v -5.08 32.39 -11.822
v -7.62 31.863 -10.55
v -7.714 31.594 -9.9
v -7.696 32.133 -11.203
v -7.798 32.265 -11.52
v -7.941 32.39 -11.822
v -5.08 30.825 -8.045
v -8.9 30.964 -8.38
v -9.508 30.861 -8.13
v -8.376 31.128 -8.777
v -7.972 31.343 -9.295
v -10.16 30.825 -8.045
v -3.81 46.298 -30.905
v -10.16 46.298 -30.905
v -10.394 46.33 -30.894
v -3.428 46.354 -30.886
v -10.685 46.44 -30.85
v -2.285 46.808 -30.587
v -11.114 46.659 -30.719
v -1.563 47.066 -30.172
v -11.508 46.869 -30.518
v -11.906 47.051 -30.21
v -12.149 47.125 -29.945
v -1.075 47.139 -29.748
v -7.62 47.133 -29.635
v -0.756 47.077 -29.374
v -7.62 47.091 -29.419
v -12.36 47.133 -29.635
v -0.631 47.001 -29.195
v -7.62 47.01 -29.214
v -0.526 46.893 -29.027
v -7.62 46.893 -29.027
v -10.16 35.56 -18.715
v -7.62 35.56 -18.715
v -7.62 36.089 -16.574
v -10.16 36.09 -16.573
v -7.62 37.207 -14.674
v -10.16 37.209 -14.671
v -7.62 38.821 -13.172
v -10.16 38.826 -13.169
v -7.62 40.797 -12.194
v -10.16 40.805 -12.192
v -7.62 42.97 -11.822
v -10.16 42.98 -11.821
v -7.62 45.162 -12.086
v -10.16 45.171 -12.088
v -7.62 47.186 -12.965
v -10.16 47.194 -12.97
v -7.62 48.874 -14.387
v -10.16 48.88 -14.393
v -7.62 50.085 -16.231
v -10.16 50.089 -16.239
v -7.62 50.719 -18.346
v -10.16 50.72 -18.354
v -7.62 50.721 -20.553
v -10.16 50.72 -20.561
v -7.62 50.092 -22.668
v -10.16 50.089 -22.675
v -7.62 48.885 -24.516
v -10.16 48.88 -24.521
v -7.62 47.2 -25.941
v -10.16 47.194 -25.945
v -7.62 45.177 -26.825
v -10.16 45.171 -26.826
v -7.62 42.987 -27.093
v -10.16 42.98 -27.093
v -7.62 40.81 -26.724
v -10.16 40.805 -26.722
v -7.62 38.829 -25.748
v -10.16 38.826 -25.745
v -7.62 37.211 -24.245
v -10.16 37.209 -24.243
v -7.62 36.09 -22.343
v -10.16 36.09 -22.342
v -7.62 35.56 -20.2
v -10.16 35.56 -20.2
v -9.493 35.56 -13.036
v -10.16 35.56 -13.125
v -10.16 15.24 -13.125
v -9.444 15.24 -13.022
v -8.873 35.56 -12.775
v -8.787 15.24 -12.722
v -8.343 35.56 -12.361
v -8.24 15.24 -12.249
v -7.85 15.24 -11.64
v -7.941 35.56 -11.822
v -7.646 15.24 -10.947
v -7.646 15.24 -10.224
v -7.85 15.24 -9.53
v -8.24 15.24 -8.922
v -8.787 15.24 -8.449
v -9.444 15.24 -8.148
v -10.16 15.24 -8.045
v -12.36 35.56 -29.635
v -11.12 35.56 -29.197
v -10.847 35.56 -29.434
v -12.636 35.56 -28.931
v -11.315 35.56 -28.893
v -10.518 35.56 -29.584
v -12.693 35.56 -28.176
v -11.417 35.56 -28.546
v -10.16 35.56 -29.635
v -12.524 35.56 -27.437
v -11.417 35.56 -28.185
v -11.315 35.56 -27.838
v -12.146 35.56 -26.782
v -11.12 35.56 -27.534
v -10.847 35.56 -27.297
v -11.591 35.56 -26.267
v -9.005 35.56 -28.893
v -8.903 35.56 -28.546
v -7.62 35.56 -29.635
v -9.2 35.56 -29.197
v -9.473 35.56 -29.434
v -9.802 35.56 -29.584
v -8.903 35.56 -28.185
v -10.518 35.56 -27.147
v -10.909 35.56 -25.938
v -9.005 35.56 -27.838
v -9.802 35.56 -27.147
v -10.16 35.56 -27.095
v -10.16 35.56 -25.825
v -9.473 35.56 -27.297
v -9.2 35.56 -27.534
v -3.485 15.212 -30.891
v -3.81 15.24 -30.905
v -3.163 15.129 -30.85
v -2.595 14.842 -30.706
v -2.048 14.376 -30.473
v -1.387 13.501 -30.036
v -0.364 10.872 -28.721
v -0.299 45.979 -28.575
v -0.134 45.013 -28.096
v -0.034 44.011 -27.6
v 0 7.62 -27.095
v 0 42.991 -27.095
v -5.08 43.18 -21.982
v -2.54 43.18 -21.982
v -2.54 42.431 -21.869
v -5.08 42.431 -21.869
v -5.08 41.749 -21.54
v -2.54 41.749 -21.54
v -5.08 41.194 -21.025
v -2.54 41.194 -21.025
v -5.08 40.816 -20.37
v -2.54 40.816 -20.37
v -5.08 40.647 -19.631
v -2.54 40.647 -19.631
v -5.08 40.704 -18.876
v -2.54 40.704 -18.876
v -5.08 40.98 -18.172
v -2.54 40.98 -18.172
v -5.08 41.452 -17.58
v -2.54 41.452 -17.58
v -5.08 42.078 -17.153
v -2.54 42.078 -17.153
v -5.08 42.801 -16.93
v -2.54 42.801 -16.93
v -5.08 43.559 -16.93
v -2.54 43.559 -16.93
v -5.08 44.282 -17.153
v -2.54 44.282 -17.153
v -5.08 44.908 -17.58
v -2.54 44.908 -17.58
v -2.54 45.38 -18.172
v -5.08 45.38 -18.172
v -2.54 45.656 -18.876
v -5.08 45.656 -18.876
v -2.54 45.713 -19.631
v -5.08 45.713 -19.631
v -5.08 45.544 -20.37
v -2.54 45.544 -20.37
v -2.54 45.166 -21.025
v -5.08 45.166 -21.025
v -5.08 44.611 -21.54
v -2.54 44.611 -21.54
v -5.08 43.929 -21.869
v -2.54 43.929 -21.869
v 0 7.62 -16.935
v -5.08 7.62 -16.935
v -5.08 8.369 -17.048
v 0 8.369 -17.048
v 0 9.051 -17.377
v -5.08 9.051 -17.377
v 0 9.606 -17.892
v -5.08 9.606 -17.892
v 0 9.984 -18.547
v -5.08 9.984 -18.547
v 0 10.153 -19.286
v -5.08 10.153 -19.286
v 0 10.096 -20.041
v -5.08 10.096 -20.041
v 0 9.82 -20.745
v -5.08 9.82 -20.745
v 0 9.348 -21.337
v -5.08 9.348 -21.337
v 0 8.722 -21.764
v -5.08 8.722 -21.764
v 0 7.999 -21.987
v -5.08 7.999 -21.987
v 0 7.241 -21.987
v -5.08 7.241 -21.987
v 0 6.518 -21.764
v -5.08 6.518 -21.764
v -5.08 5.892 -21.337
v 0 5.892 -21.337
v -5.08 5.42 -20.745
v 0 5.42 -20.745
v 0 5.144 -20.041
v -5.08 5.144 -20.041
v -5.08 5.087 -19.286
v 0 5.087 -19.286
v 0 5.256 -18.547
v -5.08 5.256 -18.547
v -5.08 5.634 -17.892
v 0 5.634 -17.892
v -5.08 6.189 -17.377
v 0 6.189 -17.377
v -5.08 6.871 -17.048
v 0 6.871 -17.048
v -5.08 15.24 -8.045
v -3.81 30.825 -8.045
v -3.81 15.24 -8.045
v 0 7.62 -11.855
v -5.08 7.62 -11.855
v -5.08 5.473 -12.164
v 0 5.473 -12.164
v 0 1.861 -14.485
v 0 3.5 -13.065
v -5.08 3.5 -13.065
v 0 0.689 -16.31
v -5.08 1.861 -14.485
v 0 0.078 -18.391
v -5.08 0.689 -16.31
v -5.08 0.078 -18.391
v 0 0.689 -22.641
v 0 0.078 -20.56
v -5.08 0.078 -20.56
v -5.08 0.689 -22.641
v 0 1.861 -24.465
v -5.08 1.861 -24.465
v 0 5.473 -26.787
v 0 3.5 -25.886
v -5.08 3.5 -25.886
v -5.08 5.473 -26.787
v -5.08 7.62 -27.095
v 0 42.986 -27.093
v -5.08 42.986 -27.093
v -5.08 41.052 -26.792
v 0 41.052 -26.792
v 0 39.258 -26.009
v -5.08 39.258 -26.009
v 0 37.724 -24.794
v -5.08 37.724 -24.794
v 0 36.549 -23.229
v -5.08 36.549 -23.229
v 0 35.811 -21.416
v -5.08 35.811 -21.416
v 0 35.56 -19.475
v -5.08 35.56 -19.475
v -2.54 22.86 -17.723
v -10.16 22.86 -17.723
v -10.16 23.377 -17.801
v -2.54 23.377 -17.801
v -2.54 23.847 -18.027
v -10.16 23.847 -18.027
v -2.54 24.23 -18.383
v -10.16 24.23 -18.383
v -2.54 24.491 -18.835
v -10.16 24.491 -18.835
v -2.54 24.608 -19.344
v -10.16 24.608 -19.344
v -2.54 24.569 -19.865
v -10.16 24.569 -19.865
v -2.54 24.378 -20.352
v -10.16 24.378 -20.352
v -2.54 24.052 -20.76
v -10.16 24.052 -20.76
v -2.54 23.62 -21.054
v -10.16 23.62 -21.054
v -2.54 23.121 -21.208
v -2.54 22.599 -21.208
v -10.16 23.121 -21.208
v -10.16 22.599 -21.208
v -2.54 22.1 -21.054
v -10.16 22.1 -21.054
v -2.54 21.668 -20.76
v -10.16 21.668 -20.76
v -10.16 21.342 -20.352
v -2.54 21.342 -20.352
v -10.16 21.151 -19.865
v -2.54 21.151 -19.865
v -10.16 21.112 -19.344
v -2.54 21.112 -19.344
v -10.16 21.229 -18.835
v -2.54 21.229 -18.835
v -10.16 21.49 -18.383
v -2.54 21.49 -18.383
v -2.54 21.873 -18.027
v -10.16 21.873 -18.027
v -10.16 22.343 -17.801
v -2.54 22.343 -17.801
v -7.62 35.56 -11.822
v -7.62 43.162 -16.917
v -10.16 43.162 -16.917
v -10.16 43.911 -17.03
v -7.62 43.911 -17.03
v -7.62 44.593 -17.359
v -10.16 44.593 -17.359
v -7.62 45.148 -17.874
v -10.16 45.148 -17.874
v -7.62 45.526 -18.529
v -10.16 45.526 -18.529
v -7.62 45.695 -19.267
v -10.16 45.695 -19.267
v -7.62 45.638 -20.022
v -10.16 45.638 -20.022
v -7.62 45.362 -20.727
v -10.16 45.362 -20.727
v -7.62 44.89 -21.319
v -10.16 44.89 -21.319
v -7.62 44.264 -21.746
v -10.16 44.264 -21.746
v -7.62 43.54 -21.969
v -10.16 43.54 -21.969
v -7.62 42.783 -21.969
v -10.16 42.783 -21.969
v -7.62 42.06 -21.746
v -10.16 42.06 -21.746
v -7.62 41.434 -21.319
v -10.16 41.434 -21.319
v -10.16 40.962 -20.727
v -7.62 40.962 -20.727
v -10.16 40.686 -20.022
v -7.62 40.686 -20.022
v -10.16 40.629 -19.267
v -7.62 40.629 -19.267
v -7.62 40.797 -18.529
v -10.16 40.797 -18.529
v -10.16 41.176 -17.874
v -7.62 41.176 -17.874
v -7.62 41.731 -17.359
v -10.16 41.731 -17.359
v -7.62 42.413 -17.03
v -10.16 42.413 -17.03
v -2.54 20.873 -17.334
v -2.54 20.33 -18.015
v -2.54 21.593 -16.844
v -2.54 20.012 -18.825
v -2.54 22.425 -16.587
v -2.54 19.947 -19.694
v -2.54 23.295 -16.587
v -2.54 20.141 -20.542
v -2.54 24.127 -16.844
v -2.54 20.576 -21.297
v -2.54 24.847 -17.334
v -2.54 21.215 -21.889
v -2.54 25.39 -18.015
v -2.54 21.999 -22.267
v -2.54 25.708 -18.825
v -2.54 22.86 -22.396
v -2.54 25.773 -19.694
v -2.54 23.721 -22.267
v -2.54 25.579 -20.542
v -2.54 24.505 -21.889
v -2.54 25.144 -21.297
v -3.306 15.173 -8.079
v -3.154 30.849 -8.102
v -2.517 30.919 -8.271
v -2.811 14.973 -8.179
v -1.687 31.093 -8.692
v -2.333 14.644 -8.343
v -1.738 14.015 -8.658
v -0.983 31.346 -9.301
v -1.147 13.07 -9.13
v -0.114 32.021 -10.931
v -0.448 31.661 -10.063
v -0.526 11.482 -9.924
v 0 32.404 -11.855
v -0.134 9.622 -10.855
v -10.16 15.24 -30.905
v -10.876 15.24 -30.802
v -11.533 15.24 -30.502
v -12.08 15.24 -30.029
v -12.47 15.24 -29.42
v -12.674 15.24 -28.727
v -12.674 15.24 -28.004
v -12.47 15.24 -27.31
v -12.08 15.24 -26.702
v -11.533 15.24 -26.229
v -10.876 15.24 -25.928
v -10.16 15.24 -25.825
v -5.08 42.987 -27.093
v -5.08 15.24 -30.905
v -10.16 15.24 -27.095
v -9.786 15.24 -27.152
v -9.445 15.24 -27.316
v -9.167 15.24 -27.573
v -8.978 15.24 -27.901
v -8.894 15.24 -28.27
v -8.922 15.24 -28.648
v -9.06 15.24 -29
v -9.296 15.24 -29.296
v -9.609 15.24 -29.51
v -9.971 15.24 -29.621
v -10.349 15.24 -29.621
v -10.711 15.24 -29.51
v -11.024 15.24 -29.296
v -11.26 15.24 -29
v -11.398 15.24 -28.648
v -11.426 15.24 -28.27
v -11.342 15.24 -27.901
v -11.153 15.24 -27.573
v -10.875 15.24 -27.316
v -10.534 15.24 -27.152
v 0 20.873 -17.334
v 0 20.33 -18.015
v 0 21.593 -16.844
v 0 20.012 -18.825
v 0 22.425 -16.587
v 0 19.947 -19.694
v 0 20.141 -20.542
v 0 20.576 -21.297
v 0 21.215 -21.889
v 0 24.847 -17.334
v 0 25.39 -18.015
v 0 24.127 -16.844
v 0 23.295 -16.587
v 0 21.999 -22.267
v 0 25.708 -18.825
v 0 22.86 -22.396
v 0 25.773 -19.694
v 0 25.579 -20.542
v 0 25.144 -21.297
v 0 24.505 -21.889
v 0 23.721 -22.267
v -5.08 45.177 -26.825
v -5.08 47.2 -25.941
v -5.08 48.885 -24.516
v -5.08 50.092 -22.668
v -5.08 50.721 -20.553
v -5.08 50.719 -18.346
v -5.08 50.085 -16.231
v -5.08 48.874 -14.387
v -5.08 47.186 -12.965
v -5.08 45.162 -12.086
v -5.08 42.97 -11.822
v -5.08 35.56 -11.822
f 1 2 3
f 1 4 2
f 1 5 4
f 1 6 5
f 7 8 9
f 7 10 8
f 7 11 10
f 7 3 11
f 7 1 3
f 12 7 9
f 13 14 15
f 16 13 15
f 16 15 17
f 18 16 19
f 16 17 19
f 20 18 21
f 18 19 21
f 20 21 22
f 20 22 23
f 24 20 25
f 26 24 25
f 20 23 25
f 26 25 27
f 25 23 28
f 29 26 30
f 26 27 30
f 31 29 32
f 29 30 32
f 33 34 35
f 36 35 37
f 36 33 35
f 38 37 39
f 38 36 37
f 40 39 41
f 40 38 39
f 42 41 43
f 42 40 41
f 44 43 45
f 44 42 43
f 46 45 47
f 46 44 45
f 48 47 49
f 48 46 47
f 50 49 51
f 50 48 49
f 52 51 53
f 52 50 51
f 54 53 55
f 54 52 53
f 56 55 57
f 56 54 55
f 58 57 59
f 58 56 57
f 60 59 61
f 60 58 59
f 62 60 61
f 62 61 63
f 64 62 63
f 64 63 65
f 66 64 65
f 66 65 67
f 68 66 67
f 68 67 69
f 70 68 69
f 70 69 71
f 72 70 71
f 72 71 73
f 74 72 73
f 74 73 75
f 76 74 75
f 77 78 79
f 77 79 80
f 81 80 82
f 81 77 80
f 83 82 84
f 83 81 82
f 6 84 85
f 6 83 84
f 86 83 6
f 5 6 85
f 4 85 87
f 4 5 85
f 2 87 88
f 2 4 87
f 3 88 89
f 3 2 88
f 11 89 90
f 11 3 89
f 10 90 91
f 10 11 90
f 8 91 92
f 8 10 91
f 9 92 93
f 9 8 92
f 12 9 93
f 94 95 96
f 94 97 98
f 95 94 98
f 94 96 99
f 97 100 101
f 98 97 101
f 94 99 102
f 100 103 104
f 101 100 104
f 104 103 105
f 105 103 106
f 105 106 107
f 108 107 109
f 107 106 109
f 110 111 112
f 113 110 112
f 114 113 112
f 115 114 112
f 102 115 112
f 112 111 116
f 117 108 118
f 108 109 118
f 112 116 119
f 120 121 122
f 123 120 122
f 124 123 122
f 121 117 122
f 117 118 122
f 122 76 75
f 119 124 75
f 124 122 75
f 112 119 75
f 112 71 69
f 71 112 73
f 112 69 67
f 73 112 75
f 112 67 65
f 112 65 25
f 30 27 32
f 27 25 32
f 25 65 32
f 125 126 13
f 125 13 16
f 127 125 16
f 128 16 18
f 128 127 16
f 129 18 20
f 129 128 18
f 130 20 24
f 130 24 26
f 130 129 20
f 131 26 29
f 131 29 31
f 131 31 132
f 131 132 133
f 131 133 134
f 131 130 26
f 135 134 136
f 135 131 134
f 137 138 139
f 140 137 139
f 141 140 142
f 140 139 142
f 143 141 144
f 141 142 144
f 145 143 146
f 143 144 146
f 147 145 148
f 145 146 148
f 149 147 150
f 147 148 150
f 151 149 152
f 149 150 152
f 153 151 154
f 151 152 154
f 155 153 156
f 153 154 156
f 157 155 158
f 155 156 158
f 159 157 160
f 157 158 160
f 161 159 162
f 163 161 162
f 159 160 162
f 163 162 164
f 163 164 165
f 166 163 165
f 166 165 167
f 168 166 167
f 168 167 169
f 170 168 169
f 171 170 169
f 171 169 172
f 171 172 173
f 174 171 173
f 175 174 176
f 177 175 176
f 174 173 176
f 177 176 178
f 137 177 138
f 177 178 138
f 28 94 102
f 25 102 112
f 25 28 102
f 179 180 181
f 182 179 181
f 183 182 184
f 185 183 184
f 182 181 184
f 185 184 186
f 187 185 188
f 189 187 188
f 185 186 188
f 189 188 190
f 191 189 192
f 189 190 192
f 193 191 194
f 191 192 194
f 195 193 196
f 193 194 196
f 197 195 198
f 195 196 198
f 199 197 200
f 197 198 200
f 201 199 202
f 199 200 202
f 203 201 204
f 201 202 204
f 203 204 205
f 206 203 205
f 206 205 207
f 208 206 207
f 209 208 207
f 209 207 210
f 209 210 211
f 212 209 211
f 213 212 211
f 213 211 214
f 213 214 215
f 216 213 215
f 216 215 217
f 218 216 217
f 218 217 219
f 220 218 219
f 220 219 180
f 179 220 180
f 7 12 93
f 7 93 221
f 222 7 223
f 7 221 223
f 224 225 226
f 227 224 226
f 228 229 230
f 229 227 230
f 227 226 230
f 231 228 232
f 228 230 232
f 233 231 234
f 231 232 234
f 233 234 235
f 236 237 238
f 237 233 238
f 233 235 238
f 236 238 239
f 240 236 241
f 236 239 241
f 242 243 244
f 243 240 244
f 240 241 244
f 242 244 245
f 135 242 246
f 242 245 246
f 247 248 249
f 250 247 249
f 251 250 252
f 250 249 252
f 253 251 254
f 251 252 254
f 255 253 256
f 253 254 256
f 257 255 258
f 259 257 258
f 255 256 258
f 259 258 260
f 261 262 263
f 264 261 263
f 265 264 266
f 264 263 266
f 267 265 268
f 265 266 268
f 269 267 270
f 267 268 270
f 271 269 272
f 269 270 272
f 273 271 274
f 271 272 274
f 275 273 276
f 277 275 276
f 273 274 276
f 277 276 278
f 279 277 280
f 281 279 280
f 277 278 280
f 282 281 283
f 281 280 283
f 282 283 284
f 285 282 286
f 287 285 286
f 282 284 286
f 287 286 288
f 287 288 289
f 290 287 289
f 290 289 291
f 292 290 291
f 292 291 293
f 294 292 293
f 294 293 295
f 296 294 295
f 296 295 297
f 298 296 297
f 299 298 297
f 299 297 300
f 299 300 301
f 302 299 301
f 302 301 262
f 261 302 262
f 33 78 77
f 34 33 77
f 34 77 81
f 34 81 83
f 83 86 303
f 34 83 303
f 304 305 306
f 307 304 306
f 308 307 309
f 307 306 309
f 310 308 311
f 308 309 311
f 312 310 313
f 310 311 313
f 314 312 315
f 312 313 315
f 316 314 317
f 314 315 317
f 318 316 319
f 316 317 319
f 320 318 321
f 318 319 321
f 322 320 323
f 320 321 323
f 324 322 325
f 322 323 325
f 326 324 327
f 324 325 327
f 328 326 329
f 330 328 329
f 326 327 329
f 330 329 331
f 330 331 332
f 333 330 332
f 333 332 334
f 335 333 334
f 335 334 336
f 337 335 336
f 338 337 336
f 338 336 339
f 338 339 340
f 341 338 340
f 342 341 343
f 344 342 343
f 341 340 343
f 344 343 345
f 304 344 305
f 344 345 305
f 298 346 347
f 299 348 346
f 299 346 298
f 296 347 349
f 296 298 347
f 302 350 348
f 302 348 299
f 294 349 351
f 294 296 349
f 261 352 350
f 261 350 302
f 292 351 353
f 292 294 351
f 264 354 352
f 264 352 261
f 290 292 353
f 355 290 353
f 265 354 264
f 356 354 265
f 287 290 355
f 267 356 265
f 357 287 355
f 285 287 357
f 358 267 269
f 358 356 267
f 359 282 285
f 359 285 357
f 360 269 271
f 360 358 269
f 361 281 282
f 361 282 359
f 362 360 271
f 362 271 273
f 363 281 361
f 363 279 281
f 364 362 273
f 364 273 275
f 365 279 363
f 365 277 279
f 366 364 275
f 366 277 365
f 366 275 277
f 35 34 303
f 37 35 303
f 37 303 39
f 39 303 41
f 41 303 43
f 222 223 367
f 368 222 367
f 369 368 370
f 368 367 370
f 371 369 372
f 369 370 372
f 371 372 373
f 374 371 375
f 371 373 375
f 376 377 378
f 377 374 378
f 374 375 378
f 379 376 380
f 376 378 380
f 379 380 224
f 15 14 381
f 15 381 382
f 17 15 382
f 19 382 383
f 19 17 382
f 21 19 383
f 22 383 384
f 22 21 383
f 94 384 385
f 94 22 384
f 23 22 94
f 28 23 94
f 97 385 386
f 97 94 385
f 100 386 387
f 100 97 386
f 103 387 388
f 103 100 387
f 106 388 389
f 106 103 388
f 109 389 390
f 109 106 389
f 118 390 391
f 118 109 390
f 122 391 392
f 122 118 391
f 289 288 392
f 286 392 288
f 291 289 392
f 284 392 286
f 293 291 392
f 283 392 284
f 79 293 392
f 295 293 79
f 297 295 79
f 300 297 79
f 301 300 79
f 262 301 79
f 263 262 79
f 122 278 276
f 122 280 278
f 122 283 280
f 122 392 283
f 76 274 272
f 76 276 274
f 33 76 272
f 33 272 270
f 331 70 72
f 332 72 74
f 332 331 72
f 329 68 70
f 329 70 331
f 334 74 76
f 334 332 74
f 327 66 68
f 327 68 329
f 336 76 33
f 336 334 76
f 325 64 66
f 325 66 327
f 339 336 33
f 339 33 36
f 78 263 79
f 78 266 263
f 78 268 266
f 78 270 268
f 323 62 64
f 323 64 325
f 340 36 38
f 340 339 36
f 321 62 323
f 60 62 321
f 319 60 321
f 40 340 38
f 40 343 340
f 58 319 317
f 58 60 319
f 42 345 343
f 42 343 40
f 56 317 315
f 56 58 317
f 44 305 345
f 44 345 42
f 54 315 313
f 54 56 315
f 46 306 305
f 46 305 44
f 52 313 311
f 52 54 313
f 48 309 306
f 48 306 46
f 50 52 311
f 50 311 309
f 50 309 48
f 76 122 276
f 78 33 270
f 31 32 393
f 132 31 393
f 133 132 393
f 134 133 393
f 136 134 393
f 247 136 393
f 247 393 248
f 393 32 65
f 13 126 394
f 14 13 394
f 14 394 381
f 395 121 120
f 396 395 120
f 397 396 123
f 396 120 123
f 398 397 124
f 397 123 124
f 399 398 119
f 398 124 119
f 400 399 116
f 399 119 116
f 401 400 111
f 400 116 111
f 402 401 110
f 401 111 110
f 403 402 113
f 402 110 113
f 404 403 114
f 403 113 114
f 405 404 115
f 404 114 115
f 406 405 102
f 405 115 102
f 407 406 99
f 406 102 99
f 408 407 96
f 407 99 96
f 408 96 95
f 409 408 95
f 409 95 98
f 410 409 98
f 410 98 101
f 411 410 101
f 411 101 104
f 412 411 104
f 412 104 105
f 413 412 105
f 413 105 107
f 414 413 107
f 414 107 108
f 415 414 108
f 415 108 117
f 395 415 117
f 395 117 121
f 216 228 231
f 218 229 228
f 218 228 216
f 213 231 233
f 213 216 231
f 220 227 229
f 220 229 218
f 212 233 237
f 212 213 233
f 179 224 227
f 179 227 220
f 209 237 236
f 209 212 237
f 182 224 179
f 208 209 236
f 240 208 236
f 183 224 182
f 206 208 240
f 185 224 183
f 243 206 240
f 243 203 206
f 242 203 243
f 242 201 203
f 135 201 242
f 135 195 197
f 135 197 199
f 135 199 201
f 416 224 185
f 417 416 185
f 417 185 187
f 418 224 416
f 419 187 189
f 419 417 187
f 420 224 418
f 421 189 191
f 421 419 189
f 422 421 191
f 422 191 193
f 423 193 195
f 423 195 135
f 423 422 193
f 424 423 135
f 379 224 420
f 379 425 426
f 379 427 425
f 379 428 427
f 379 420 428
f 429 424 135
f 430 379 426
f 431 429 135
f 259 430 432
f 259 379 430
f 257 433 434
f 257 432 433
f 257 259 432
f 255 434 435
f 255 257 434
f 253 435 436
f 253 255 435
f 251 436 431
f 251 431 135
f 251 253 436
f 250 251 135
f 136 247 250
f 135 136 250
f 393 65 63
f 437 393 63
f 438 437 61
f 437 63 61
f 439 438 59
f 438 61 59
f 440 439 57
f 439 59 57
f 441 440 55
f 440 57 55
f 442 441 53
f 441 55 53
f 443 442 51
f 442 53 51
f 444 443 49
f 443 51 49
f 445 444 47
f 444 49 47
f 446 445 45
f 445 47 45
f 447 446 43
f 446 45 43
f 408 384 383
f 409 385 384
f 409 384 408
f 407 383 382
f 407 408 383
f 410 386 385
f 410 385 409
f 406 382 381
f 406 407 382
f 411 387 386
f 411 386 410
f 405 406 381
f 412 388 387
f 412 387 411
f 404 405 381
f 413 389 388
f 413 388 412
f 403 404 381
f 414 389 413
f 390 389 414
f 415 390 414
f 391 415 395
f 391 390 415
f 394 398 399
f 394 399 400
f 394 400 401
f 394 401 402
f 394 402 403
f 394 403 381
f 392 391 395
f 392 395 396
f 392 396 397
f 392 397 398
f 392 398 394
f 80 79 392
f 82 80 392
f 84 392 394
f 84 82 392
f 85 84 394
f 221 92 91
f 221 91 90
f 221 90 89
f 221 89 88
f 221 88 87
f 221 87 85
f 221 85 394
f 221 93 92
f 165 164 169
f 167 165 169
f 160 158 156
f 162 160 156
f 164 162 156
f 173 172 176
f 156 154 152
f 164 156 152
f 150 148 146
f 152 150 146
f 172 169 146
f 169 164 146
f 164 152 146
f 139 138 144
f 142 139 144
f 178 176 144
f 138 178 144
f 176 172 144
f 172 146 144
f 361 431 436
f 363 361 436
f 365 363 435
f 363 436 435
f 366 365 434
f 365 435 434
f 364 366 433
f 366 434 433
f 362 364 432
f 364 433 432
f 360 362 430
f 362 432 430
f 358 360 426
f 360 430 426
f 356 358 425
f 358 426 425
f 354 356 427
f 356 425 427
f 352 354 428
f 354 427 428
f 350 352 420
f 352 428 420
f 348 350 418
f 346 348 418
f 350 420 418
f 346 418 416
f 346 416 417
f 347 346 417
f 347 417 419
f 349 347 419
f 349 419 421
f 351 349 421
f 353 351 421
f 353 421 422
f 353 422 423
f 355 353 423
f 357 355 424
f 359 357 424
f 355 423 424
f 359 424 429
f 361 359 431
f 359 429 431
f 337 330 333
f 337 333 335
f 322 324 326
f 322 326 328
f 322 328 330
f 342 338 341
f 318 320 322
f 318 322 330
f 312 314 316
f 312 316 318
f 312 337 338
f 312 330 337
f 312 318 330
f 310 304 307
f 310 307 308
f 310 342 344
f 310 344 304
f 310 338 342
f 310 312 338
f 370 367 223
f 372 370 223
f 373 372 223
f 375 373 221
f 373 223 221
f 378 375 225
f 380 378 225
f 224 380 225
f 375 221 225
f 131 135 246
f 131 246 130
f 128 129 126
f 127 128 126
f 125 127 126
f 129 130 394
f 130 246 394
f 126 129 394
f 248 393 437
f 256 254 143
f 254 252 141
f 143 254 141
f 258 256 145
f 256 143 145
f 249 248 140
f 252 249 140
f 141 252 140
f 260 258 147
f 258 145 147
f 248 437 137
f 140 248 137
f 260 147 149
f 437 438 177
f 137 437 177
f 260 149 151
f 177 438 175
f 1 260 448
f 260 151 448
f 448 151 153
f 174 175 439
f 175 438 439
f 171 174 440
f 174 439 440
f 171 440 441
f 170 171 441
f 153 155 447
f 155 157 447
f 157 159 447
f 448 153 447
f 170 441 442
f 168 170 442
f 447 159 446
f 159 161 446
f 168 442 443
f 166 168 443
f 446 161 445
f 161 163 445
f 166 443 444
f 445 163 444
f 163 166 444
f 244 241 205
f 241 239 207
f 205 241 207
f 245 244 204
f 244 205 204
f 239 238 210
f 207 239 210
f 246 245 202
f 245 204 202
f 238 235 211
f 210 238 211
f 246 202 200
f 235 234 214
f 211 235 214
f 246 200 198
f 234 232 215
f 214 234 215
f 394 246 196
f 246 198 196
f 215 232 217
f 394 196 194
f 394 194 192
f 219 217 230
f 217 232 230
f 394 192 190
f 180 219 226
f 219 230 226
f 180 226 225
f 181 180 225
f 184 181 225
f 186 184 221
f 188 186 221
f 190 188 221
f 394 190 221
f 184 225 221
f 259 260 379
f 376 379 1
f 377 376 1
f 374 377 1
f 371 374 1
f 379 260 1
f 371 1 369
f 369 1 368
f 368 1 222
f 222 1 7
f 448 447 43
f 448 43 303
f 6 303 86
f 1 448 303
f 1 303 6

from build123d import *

# Parameters (mm, degrees)
BOSS_EXTRUDE1_DEPTH = 50.8
SKETCH3_R           = 1.27
CUT_EXTRUDE2_DEPTH  = 50.8
CUT_EXTRUDE1_DEPTH  = 50.8
CUT_EXTRUDE6_DEPTH  = 50.8
BOSS_EXTRUDE3_DEPTH = 20.32
SKETCH4_W           = 10.16
SKETCH4_H           = 15.24
CUT_EXTRUDE3_DEPTH  = 50.8
SKETCH5_R           = 2.54
CUT_EXTRUDE5_DEPTH  = 50.8
SKETCH8_R           = 2.54
BOSS_EXTRUDE2_DEPTH = 2.54
LPATTERN1_COUNT     = 2
LPATTERN1_PITCH     = 12.7
CUT_EXTRUDE7_DEPTH  = 20.32
SKETCH12_W          = 5.08
SKETCH12_H          = 19.941398178
CUT_EXTRUDE8_DEPTH  = 21.59
CUT_EXTRUDE9_DEPTH  = 5.08
LPATTERN2_COUNT     = 2
LPATTERN2_PITCH     = 15.24
CUT_EXTRUDE10_DEPTH = 40.767
BOSS_EXTRUDE4_START = 2.54
SKETCH16_R          = 7.638081415
BOSS_EXTRUDE4_DEPTH = 2.54
SKETCH17_R          = 2.54
CUT_EXTRUDE11_DEPTH = 2.54
SKETCH23_W          = 3.776239755
SKETCH23_H          = 7.410355269
CUT_EXTRUDE16_DEPTH = 2.54
CUT_EXTRUDE17_DEPTH = 9.906
SKETCH25_R          = 1.7526
CUT_EXTRUDE18_DEPTH = 20.828
SKETCH26_R          = 2.921
CUT_EXTRUDE19_DEPTH = 2.54


with BuildPart() as part:
    # Sketch1 → Boss-Extrude1 (new body)
    with BuildSketch(Plane(origin=(0, 0, 0), x_dir=(1, 0, 0), z_dir=(0, 1, 0))):
        with BuildLine():
            Line((-20.32, 27.095319289), (-20.32, 11.855319289))
            ThreePointArc((-20.32, 11.855319289), (-19.204076836, 9.161242453), (-16.51, 8.045319289))
            Line((-16.51, 8.045319289), (-3.81, 8.045319289))
            ThreePointArc((-3.81, 8.045319289), (-1.115923164, 9.161242453), (0, 11.855319289))
            Line((0, 11.855319289), (0, 27.095319289))
            ThreePointArc((0, 27.095319289), (-1.115923164, 29.789396126), (-3.81, 30.905319289))
            Line((-3.81, 30.905319289), (-16.51, 30.905319289))
            ThreePointArc((-16.51, 30.905319289), (-19.204076836, 29.789396126), (-20.32, 27.095319289))
        make_face()
    extrude(amount=BOSS_EXTRUDE1_DEPTH)

    # Sketch3 → Cut-Extrude2 (cut)
    with BuildSketch(Plane(origin=(0, 50.8, 0), x_dir=(1, 0, 0), z_dir=(0, 1, 0))):
        with Locations(Location((-10.16, 10.585319289, 0), (0, 0, 270))):
            Circle(SKETCH3_R)
        with Locations(Location((-10.16, 28.365319289, 0), (0, 0, 270))):
            Circle(SKETCH3_R)
    extrude(amount=-CUT_EXTRUDE2_DEPTH, mode=Mode.SUBTRACT)

    # Sketch2 → Cut-Extrude1 (cut)
    with BuildSketch(Plane.ZY.offset(20.32)):
        with BuildLine():
            Line((-27.095319289, 7.62), (-30.905319289, 15.24))
            Line((-30.905319289, 15.24), (-30.905319289, -5.08))
            Line((-30.905319289, -5.08), (-8.045319289, -5.08))
            Line((-8.045319289, -5.08), (-8.045319289, 15.24))
            Line((-8.045319289, 15.24), (-11.855319289, 7.62))
            ThreePointArc((-11.855319289, 7.62), (-19.475319289, 0), (-27.095319289, 7.62))
        make_face()
        with BuildLine():
            Line((-11.821559044, 42.970355269), (-8.045319289, 35.56))
            Line((-8.045319289, 35.56), (-8.045319289, 55.88))
            Line((-8.045319289, 55.88), (-30.905319289, 55.88))
            Line((-30.905319289, 55.88), (-30.905319289, 35.56))
            Line((-30.905319289, 35.56), (-27.092422036, 42.951560486))
            ThreePointArc((-27.092422036, 42.951560486), (-19.46663852, 50.799994215), (-11.821559044, 42.970355269))
        make_face()
    extrude(amount=-CUT_EXTRUDE1_DEPTH, mode=Mode.SUBTRACT)

    # Sketch7 → Cut-Extrude6 (cut)
    with BuildSketch(Plane.XY.offset(-8.045319289)):
        Polygon((-15.24, 50.8), (-12.7, 50.8), (-12.7, 35.56), (-7.62, 35.56), (-7.62, 50.8), (-5.08, 50.8), (-5.08, 35.56), (0, 35.56), (0, 59.156438057), (-20.32, 59.156438057), (-20.32, 35.56), (-15.24, 35.56), align=None)
    extrude(amount=-CUT_EXTRUDE6_DEPTH, mode=Mode.SUBTRACT)

    # Sketch9 → Boss-Extrude3 (add)
    with BuildSketch(Plane.ZY.offset(20.32)):
        with BuildLine():
            Line((-19.475319289, 35.56), (-30.961107471, 35.56))
            Line((-30.961107471, 35.56), (-30.961107471, 45.935432902))
            ThreePointArc((-30.961107471, 45.935432902), (-30.291229548, 47.014503778), (-29.026975399, 46.892882091))
            Line((-29.026975399, 46.892882091), (-27.092843326, 42.985764183))
            ThreePointArc((-27.092843326, 42.985764183), (-24.794356941, 37.723605727), (-19.475319289, 35.56))
        make_face()
    extrude(amount=-BOSS_EXTRUDE3_DEPTH)

    # Sketch4 → Cut-Extrude3 (cut)
    with BuildSketch(Plane.XY.offset(-8.045319289)):
        with Locations((-10.16, 7.62)):
            Rectangle(SKETCH4_W, SKETCH4_H)
    extrude(amount=-CUT_EXTRUDE3_DEPTH, mode=Mode.SUBTRACT)

    # Sketch5 → Cut-Extrude5 (cut)
    with BuildSketch(Plane.ZY.offset(20.32)):
        with Locations((-19.475319289, 7.62)):
            Circle(SKETCH5_R)
    extrude(amount=-CUT_EXTRUDE5_DEPTH, mode=Mode.SUBTRACT)

    # Sketch8 → Boss-Extrude2 (add)
    with BuildSketch(Plane.ZY.offset(15.24)):
        with Locations(Location((-19.441559044, 43.179995622, 0), (0, 0, 180))):
            Circle(SKETCH8_R)
    boss_extrude2 = extrude(amount=BOSS_EXTRUDE2_DEPTH)

    # LPattern1: Boss-Extrude2 ×2
    with Locations(*[(i * LPATTERN1_PITCH, 0, 0) for i in range(1, LPATTERN1_COUNT)]):
        add(boss_extrude2)

    # Sketch10 → Cut-Extrude7 (cut)
    with BuildSketch(Plane.XZ.offset(-35.56)):
        with BuildLine():
            Line((-16.51, -30.905319289), (-3.81, -30.905319289))
            ThreePointArc((-3.81, -30.905319289), (-1.115923164, -29.789396126), (0, -27.095319289))
            Line((0, -27.095319289), (5.770912039, -37.258829719))
            Line((5.770912039, -37.258829719), (-26.797758959, -37.890739908))
            Line((-26.797758959, -37.890739908), (-20.32, -27.095319289))
            ThreePointArc((-20.32, -27.095319289), (-19.204076836, -29.789396126), (-16.51, -30.905319289))
        make_face()
    extrude(amount=-CUT_EXTRUDE7_DEPTH, mode=Mode.SUBTRACT)

    # Sketch12 → Cut-Extrude8 (cut)
    with BuildSketch(Plane.XY.offset(-8.045319289)):
        with Locations((-10.16, 45.530699089)):
            Rectangle(SKETCH12_W, SKETCH12_H)
    extrude(amount=-CUT_EXTRUDE8_DEPTH, mode=Mode.SUBTRACT)

    # Sketch13 → Cut-Extrude9 (cut)
    with BuildSketch(Plane.ZY.offset(20.32)):
        Polygon((-19.475319289, 35.56), (-8.045319289, 30.82545932), (-1.320705488, 30.82545932), (-1.320705488, 35.56), align=None)
    cut_extrude9 = extrude(amount=-CUT_EXTRUDE9_DEPTH, mode=Mode.SUBTRACT)

    # LPattern2: Cut-Extrude9 ×2
    with Locations(*[(i * LPATTERN2_PITCH, 0, 0) for i in range(1, LPATTERN2_COUNT)]):
        add(cut_extrude9, mode=Mode.SUBTRACT)

    # Sketch15 → Cut-Extrude10 (cut, symmetric)
    with BuildSketch(Plane(origin=(0, 35.56, 0), x_dir=(1, 0, 0), z_dir=(0, 1, 0))):
        with BuildLine():
            Line((-10.16, 25.825319289), (-10.16, 13.125319289))
            ThreePointArc((-10.16, 13.125319289), (-7.62, 10.585319289), (-10.16, 8.045319289))
            Line((-10.16, 8.045319289), (-39.973745678, -4.467023153))
            Line((-39.973745678, -4.467023153), (-44.095820535, 43.963158694))
            Line((-44.095820535, 43.963158694), (-10.16, 30.905319289))
            ThreePointArc((-10.16, 30.905319289), (-12.7, 28.365319289), (-10.16, 25.825319289))
        make_face()
    extrude(amount=CUT_EXTRUDE10_DEPTH, both=True, mode=Mode.SUBTRACT)

    # Sketch16 → Boss-Extrude4 (add)
    with BuildSketch(Plane.ZY.offset(7.62).offset(BOSS_EXTRUDE4_START)):
        with Locations((-19.457237874, 43.161918585)):
            Circle(SKETCH16_R)
    extrude(amount=-BOSS_EXTRUDE4_DEPTH)

    # Sketch17 → Cut-Extrude11 (cut)
    with BuildSketch(Plane.ZY.offset(10.16)):
        with Locations((-19.457237874, 43.161918585)):
            Circle(SKETCH17_R)
    extrude(amount=-CUT_EXTRUDE11_DEPTH, mode=Mode.SUBTRACT)

    # Sketch23 → Cut-Extrude16 (cut)
    with BuildSketch(Plane(origin=(-5.08, 0, 0), x_dir=(0, 0, -1), z_dir=(1, 0, 0))):
        with Locations((9.933439167, 39.265177635)):
            Rectangle(SKETCH23_W, SKETCH23_H)
    extrude(amount=-CUT_EXTRUDE16_DEPTH, mode=Mode.SUBTRACT)

    # Sketch24 → Cut-Extrude17 (cut)
    with BuildSketch(Plane(origin=(-5.08, 0, 0), x_dir=(0, 0, -1), z_dir=(1, 0, 0))):
        Polygon((8.045319289, 35.56), (11.821559044, 35.56), (11.821559044, 32.38965536), (8.045319289, 30.82545932), align=None)
    extrude(amount=-CUT_EXTRUDE17_DEPTH, mode=Mode.SUBTRACT)

    # Sketch25 → Cut-Extrude18 (cut)
    with BuildSketch(Plane.ZY.offset(10.16)):
        with Locations((-19.475319289, 22.86)):
            Circle(SKETCH25_R)
    extrude(amount=-CUT_EXTRUDE18_DEPTH, mode=Mode.SUBTRACT)

    # Sketch26 → Cut-Extrude19 (cut)
    with BuildSketch(Plane(origin=(0, 0, 0), x_dir=(0, 0, -1), z_dir=(1, 0, 0))):
        with Locations((19.475319289, 22.86)):
            Circle(SKETCH26_R)
    extrude(amount=-CUT_EXTRUDE19_DEPTH, mode=Mode.SUBTRACT)


solid = part.part
